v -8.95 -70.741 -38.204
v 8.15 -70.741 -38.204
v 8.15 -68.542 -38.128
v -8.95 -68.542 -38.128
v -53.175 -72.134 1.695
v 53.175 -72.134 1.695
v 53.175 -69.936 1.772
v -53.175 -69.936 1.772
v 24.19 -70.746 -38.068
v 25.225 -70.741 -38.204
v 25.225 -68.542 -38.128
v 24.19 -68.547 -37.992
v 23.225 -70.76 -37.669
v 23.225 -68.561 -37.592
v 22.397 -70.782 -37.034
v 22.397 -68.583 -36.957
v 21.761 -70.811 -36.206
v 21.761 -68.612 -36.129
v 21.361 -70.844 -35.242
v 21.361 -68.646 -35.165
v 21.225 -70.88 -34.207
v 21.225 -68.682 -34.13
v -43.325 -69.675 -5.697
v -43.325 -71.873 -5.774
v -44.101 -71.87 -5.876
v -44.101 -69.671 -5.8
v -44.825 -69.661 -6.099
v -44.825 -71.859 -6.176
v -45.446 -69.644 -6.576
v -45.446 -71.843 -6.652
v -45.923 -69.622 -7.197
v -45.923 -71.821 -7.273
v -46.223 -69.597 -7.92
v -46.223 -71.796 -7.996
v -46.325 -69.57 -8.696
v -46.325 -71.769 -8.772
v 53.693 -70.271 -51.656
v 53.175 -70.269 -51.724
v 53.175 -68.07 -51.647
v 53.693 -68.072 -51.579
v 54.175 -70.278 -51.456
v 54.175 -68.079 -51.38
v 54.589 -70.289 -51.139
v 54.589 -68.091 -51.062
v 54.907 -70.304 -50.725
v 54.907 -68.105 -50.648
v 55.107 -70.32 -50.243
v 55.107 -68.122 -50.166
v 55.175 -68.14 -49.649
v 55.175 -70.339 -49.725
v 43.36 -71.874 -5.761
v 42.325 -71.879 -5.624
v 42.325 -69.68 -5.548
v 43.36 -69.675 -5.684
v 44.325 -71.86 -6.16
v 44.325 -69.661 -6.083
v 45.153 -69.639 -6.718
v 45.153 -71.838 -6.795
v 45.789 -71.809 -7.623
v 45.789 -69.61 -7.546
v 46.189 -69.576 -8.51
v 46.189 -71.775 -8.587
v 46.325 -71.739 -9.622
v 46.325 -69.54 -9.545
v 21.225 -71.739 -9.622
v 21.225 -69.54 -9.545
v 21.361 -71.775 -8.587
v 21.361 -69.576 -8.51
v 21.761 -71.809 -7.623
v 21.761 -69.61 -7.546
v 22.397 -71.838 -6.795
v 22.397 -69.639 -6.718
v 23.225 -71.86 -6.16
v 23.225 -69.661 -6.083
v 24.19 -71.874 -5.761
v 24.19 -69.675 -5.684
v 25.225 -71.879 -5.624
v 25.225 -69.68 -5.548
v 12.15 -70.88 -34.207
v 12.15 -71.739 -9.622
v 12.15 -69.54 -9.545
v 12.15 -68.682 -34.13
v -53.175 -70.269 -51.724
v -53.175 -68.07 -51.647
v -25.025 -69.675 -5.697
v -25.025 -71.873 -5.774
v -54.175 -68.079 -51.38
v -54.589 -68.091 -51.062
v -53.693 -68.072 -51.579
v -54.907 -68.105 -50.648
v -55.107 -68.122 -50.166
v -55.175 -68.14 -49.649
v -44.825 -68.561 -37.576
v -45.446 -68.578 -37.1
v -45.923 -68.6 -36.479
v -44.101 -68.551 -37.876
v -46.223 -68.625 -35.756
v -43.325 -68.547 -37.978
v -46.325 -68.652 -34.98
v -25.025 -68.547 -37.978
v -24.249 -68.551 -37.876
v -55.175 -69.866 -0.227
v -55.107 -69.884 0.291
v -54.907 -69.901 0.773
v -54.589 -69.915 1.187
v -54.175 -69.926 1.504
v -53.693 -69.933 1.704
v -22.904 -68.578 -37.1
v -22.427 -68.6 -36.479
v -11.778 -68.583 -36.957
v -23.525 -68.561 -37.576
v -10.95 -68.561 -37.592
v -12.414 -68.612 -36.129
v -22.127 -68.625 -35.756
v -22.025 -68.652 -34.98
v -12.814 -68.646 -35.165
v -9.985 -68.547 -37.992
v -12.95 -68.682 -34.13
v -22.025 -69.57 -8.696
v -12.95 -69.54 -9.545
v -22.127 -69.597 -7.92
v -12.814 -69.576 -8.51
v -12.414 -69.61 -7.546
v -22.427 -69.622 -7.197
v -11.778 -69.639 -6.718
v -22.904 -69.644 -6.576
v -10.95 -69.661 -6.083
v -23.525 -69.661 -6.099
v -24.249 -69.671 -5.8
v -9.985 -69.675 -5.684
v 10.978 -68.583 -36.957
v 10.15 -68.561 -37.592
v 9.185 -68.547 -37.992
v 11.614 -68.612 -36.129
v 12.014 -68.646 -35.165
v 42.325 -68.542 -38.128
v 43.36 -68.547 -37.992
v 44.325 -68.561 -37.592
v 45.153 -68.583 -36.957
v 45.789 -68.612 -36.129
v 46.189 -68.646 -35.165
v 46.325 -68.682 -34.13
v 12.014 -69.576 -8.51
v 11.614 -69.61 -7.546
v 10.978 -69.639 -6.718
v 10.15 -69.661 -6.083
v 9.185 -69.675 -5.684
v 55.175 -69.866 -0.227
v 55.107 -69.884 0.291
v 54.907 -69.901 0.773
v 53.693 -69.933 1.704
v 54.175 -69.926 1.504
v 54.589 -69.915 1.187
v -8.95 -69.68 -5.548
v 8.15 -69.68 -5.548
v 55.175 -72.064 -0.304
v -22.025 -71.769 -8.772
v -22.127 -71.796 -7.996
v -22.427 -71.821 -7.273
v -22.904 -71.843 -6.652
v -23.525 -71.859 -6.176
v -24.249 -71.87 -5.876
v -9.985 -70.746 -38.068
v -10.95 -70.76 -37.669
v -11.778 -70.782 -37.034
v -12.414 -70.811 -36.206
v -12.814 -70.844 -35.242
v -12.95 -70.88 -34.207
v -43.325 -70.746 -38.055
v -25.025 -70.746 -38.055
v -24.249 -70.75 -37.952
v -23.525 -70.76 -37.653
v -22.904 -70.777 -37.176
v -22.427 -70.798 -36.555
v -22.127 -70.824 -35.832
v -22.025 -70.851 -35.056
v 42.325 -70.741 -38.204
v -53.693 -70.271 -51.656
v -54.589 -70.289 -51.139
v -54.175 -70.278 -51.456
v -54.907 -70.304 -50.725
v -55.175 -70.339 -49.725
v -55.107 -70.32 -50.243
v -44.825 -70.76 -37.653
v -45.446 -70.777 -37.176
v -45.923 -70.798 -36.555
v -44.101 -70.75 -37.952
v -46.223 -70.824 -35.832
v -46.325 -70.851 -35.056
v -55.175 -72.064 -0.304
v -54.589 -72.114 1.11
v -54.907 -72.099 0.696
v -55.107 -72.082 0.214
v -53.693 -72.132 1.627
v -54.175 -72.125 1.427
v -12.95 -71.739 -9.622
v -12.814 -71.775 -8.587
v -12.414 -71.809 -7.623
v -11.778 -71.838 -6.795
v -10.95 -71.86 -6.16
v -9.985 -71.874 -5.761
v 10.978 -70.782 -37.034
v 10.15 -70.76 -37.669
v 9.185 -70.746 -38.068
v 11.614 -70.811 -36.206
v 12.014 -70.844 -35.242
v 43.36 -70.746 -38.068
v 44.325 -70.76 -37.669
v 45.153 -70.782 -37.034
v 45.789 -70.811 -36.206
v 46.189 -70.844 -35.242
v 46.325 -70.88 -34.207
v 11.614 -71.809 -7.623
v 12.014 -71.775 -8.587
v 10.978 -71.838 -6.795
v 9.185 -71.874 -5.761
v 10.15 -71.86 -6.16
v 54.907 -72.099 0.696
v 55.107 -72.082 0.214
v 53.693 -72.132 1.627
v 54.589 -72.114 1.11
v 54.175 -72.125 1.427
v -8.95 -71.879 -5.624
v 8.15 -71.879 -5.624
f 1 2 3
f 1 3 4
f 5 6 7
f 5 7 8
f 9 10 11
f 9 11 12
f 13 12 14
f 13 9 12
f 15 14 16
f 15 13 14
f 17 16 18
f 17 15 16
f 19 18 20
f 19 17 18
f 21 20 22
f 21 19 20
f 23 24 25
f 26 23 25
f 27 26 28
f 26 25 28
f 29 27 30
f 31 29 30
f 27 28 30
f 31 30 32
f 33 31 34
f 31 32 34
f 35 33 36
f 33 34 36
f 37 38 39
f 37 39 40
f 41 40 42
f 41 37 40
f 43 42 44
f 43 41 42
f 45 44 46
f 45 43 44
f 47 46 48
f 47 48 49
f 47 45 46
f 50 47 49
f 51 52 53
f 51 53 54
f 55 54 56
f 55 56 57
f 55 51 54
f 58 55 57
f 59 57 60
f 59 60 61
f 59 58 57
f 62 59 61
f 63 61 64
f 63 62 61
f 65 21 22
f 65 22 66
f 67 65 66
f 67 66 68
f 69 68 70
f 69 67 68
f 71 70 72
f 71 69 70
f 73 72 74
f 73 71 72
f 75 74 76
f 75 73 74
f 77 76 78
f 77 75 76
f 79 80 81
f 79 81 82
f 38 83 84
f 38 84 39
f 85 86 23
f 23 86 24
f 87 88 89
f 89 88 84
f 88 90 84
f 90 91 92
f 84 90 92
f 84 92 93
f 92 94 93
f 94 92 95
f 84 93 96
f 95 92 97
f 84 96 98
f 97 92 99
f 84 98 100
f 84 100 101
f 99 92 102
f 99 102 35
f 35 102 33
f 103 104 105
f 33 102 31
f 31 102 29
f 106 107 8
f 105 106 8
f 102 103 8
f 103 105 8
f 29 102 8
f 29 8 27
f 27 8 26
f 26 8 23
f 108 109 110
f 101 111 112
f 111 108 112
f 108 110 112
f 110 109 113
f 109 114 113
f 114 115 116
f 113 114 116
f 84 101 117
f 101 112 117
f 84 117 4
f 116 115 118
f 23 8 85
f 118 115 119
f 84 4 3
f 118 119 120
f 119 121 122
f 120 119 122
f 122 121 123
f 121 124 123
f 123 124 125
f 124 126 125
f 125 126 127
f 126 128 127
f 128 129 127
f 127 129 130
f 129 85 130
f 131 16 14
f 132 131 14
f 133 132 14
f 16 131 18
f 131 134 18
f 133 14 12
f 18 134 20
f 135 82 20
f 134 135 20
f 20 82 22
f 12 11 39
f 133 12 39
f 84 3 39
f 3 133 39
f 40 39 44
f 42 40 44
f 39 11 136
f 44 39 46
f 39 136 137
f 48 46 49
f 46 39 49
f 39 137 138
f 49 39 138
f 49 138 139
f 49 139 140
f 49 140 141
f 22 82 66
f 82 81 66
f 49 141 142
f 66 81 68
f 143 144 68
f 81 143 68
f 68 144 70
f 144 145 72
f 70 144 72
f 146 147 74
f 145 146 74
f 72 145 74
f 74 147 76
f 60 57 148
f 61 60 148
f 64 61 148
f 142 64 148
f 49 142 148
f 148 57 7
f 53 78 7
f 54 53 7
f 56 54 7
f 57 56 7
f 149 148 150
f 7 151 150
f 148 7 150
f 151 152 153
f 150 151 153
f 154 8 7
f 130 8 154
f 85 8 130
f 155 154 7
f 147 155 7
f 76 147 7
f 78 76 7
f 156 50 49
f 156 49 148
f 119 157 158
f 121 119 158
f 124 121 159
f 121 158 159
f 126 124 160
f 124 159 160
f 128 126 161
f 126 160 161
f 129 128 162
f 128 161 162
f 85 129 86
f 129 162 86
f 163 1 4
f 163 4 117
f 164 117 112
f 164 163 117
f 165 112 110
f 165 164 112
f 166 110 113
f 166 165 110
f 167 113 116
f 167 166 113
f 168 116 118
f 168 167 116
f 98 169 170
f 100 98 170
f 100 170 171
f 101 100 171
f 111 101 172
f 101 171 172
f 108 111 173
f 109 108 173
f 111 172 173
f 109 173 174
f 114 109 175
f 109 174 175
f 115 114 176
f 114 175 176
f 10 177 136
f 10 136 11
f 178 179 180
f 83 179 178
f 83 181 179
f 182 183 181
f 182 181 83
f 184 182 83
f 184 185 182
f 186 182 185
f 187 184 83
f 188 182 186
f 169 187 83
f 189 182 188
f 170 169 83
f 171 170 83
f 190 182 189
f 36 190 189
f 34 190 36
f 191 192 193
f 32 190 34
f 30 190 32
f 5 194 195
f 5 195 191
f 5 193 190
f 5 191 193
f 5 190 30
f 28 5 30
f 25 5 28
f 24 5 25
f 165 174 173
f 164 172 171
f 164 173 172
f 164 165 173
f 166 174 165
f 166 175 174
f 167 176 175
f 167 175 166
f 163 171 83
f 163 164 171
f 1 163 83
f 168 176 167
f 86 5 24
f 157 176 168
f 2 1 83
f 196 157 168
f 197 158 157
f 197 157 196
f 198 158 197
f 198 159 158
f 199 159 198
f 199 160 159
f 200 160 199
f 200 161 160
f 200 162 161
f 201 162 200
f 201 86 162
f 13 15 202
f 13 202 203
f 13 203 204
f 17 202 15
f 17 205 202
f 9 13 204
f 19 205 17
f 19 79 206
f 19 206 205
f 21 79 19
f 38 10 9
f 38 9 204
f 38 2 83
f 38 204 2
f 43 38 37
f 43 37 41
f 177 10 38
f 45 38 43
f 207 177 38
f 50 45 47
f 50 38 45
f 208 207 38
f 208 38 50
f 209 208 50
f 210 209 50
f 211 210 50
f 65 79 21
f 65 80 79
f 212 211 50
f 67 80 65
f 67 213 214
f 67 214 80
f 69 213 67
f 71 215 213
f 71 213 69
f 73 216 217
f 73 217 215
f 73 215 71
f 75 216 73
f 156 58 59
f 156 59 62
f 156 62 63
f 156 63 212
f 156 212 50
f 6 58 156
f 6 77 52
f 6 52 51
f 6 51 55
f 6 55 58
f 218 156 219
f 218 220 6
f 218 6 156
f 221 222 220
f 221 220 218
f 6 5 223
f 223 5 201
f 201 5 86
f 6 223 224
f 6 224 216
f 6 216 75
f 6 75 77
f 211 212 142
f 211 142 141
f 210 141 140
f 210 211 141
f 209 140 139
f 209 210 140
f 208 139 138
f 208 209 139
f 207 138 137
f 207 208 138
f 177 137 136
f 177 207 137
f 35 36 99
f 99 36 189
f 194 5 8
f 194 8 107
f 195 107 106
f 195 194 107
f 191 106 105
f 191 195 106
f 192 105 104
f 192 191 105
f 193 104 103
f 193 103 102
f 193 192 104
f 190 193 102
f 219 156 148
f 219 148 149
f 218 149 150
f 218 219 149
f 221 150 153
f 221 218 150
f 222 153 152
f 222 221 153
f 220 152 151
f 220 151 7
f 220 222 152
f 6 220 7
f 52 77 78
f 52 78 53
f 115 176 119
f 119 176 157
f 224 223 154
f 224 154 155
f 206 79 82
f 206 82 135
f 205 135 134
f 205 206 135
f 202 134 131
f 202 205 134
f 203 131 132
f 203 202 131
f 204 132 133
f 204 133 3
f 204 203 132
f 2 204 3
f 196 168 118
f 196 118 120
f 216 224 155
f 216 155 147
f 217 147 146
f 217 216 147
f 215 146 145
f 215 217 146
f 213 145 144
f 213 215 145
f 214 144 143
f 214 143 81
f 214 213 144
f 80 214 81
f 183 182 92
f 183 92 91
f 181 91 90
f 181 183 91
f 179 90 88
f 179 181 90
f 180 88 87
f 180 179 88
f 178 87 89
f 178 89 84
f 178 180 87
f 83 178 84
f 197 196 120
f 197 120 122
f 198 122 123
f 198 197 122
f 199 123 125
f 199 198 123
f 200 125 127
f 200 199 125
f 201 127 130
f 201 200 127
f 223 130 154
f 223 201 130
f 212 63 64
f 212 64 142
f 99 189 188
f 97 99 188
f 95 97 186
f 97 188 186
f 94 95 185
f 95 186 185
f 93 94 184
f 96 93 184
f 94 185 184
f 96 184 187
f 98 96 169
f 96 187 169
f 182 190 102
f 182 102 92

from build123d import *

# Parameters (mm, degrees)
BOSS_EXTRUDE1_DEPTH = 2.2


with BuildPart() as part:
    # Sketch1 → Boss-Extrude1 (new body)
    with BuildSketch(Plane(origin=(0, -71.98718802, -2.513847999), x_dir=(1, 0, 0), z_dir=(0, -0.9993908270190958, -0.034899496702501066))):
        with BuildLine():
            Line((-53.175, -49.240365792), (53.175, -49.240365792))
            ThreePointArc((53.175, -49.240365792), (54.589213562, -48.654579354), (55.175, -47.240365792))
            Line((55.175, -47.240365792), (55.175, 2.21159528))
            ThreePointArc((55.175, 2.21159528), (54.589213562, 3.625808843), (53.175, 4.21159528))
            Line((53.175, 4.21159528), (-53.175, 4.21159528))
            ThreePointArc((-53.175, 4.21159528), (-54.589213562, 3.625808843), (-55.175, 2.21159528))
            Line((-55.175, 2.21159528), (-55.175, -47.240365792))
            ThreePointArc((-55.175, -47.240365792), (-54.589213562, -48.654579354), (-53.175, -49.240365792))
        make_face()
        with BuildLine():
            Line((-22.025, -32.562401314), (-22.025, -6.262401314))
            ThreePointArc((-22.025, -6.262401314), (-22.903679656, -4.14108097), (-25.025, -3.262401314))
            Line((-25.025, -3.262401314), (-43.325, -3.262401314))
            ThreePointArc((-43.325, -3.262401314), (-45.446320344, -4.14108097), (-46.325, -6.262401314))
            Line((-46.325, -6.262401314), (-46.325, -32.562401314))
            ThreePointArc((-46.325, -32.562401314), (-45.446320344, -34.683721657), (-43.325, -35.562401314))
            Line((-43.325, -35.562401314), (-25.025, -35.562401314))
            ThreePointArc((-25.025, -35.562401314), (-22.903679656, -34.683721657), (-22.025, -32.562401314))
        make_face(mode=Mode.SUBTRACT)
        with BuildLine():
            Line((-8.95, -3.112401314), (8.15, -3.112401314))
            ThreePointArc((8.15, -3.112401314), (10.978427125, -4.283974189), (12.15, -7.112401314))
            Line((12.15, -7.112401314), (12.15, -31.712401314))
            ThreePointArc((12.15, -31.712401314), (10.978427125, -34.540828439), (8.15, -35.712401314))
            Line((8.15, -35.712401314), (-8.95, -35.712401314))
            ThreePointArc((-8.95, -35.712401314), (-11.778427125, -34.540828439), (-12.95, -31.712401314))
            Line((-12.95, -31.712401314), (-12.95, -7.112401314))
            ThreePointArc((-12.95, -7.112401314), (-11.778427125, -4.283974189), (-8.95, -3.112401314))
        make_face(mode=Mode.SUBTRACT)
        with BuildLine():
            Line((25.225, -3.112401314), (42.325, -3.112401314))
            ThreePointArc((42.325, -3.112401314), (45.153427125, -4.283974189), (46.325, -7.112401314))
            Line((46.325, -7.112401314), (46.325, -31.712401314))
            ThreePointArc((46.325, -31.712401314), (45.153427125, -34.540828439), (42.325, -35.712401314))
            Line((42.325, -35.712401314), (25.225, -35.712401314))
            ThreePointArc((25.225, -35.712401314), (22.396572875, -34.540828439), (21.225, -31.712401314))
            Line((21.225, -31.712401314), (21.225, -7.112401314))
            ThreePointArc((21.225, -7.112401314), (22.396572875, -4.283974189), (25.225, -3.112401314))
        make_face(mode=Mode.SUBTRACT)
    extrude(amount=-BOSS_EXTRUDE1_DEPTH)


solid = part.part
